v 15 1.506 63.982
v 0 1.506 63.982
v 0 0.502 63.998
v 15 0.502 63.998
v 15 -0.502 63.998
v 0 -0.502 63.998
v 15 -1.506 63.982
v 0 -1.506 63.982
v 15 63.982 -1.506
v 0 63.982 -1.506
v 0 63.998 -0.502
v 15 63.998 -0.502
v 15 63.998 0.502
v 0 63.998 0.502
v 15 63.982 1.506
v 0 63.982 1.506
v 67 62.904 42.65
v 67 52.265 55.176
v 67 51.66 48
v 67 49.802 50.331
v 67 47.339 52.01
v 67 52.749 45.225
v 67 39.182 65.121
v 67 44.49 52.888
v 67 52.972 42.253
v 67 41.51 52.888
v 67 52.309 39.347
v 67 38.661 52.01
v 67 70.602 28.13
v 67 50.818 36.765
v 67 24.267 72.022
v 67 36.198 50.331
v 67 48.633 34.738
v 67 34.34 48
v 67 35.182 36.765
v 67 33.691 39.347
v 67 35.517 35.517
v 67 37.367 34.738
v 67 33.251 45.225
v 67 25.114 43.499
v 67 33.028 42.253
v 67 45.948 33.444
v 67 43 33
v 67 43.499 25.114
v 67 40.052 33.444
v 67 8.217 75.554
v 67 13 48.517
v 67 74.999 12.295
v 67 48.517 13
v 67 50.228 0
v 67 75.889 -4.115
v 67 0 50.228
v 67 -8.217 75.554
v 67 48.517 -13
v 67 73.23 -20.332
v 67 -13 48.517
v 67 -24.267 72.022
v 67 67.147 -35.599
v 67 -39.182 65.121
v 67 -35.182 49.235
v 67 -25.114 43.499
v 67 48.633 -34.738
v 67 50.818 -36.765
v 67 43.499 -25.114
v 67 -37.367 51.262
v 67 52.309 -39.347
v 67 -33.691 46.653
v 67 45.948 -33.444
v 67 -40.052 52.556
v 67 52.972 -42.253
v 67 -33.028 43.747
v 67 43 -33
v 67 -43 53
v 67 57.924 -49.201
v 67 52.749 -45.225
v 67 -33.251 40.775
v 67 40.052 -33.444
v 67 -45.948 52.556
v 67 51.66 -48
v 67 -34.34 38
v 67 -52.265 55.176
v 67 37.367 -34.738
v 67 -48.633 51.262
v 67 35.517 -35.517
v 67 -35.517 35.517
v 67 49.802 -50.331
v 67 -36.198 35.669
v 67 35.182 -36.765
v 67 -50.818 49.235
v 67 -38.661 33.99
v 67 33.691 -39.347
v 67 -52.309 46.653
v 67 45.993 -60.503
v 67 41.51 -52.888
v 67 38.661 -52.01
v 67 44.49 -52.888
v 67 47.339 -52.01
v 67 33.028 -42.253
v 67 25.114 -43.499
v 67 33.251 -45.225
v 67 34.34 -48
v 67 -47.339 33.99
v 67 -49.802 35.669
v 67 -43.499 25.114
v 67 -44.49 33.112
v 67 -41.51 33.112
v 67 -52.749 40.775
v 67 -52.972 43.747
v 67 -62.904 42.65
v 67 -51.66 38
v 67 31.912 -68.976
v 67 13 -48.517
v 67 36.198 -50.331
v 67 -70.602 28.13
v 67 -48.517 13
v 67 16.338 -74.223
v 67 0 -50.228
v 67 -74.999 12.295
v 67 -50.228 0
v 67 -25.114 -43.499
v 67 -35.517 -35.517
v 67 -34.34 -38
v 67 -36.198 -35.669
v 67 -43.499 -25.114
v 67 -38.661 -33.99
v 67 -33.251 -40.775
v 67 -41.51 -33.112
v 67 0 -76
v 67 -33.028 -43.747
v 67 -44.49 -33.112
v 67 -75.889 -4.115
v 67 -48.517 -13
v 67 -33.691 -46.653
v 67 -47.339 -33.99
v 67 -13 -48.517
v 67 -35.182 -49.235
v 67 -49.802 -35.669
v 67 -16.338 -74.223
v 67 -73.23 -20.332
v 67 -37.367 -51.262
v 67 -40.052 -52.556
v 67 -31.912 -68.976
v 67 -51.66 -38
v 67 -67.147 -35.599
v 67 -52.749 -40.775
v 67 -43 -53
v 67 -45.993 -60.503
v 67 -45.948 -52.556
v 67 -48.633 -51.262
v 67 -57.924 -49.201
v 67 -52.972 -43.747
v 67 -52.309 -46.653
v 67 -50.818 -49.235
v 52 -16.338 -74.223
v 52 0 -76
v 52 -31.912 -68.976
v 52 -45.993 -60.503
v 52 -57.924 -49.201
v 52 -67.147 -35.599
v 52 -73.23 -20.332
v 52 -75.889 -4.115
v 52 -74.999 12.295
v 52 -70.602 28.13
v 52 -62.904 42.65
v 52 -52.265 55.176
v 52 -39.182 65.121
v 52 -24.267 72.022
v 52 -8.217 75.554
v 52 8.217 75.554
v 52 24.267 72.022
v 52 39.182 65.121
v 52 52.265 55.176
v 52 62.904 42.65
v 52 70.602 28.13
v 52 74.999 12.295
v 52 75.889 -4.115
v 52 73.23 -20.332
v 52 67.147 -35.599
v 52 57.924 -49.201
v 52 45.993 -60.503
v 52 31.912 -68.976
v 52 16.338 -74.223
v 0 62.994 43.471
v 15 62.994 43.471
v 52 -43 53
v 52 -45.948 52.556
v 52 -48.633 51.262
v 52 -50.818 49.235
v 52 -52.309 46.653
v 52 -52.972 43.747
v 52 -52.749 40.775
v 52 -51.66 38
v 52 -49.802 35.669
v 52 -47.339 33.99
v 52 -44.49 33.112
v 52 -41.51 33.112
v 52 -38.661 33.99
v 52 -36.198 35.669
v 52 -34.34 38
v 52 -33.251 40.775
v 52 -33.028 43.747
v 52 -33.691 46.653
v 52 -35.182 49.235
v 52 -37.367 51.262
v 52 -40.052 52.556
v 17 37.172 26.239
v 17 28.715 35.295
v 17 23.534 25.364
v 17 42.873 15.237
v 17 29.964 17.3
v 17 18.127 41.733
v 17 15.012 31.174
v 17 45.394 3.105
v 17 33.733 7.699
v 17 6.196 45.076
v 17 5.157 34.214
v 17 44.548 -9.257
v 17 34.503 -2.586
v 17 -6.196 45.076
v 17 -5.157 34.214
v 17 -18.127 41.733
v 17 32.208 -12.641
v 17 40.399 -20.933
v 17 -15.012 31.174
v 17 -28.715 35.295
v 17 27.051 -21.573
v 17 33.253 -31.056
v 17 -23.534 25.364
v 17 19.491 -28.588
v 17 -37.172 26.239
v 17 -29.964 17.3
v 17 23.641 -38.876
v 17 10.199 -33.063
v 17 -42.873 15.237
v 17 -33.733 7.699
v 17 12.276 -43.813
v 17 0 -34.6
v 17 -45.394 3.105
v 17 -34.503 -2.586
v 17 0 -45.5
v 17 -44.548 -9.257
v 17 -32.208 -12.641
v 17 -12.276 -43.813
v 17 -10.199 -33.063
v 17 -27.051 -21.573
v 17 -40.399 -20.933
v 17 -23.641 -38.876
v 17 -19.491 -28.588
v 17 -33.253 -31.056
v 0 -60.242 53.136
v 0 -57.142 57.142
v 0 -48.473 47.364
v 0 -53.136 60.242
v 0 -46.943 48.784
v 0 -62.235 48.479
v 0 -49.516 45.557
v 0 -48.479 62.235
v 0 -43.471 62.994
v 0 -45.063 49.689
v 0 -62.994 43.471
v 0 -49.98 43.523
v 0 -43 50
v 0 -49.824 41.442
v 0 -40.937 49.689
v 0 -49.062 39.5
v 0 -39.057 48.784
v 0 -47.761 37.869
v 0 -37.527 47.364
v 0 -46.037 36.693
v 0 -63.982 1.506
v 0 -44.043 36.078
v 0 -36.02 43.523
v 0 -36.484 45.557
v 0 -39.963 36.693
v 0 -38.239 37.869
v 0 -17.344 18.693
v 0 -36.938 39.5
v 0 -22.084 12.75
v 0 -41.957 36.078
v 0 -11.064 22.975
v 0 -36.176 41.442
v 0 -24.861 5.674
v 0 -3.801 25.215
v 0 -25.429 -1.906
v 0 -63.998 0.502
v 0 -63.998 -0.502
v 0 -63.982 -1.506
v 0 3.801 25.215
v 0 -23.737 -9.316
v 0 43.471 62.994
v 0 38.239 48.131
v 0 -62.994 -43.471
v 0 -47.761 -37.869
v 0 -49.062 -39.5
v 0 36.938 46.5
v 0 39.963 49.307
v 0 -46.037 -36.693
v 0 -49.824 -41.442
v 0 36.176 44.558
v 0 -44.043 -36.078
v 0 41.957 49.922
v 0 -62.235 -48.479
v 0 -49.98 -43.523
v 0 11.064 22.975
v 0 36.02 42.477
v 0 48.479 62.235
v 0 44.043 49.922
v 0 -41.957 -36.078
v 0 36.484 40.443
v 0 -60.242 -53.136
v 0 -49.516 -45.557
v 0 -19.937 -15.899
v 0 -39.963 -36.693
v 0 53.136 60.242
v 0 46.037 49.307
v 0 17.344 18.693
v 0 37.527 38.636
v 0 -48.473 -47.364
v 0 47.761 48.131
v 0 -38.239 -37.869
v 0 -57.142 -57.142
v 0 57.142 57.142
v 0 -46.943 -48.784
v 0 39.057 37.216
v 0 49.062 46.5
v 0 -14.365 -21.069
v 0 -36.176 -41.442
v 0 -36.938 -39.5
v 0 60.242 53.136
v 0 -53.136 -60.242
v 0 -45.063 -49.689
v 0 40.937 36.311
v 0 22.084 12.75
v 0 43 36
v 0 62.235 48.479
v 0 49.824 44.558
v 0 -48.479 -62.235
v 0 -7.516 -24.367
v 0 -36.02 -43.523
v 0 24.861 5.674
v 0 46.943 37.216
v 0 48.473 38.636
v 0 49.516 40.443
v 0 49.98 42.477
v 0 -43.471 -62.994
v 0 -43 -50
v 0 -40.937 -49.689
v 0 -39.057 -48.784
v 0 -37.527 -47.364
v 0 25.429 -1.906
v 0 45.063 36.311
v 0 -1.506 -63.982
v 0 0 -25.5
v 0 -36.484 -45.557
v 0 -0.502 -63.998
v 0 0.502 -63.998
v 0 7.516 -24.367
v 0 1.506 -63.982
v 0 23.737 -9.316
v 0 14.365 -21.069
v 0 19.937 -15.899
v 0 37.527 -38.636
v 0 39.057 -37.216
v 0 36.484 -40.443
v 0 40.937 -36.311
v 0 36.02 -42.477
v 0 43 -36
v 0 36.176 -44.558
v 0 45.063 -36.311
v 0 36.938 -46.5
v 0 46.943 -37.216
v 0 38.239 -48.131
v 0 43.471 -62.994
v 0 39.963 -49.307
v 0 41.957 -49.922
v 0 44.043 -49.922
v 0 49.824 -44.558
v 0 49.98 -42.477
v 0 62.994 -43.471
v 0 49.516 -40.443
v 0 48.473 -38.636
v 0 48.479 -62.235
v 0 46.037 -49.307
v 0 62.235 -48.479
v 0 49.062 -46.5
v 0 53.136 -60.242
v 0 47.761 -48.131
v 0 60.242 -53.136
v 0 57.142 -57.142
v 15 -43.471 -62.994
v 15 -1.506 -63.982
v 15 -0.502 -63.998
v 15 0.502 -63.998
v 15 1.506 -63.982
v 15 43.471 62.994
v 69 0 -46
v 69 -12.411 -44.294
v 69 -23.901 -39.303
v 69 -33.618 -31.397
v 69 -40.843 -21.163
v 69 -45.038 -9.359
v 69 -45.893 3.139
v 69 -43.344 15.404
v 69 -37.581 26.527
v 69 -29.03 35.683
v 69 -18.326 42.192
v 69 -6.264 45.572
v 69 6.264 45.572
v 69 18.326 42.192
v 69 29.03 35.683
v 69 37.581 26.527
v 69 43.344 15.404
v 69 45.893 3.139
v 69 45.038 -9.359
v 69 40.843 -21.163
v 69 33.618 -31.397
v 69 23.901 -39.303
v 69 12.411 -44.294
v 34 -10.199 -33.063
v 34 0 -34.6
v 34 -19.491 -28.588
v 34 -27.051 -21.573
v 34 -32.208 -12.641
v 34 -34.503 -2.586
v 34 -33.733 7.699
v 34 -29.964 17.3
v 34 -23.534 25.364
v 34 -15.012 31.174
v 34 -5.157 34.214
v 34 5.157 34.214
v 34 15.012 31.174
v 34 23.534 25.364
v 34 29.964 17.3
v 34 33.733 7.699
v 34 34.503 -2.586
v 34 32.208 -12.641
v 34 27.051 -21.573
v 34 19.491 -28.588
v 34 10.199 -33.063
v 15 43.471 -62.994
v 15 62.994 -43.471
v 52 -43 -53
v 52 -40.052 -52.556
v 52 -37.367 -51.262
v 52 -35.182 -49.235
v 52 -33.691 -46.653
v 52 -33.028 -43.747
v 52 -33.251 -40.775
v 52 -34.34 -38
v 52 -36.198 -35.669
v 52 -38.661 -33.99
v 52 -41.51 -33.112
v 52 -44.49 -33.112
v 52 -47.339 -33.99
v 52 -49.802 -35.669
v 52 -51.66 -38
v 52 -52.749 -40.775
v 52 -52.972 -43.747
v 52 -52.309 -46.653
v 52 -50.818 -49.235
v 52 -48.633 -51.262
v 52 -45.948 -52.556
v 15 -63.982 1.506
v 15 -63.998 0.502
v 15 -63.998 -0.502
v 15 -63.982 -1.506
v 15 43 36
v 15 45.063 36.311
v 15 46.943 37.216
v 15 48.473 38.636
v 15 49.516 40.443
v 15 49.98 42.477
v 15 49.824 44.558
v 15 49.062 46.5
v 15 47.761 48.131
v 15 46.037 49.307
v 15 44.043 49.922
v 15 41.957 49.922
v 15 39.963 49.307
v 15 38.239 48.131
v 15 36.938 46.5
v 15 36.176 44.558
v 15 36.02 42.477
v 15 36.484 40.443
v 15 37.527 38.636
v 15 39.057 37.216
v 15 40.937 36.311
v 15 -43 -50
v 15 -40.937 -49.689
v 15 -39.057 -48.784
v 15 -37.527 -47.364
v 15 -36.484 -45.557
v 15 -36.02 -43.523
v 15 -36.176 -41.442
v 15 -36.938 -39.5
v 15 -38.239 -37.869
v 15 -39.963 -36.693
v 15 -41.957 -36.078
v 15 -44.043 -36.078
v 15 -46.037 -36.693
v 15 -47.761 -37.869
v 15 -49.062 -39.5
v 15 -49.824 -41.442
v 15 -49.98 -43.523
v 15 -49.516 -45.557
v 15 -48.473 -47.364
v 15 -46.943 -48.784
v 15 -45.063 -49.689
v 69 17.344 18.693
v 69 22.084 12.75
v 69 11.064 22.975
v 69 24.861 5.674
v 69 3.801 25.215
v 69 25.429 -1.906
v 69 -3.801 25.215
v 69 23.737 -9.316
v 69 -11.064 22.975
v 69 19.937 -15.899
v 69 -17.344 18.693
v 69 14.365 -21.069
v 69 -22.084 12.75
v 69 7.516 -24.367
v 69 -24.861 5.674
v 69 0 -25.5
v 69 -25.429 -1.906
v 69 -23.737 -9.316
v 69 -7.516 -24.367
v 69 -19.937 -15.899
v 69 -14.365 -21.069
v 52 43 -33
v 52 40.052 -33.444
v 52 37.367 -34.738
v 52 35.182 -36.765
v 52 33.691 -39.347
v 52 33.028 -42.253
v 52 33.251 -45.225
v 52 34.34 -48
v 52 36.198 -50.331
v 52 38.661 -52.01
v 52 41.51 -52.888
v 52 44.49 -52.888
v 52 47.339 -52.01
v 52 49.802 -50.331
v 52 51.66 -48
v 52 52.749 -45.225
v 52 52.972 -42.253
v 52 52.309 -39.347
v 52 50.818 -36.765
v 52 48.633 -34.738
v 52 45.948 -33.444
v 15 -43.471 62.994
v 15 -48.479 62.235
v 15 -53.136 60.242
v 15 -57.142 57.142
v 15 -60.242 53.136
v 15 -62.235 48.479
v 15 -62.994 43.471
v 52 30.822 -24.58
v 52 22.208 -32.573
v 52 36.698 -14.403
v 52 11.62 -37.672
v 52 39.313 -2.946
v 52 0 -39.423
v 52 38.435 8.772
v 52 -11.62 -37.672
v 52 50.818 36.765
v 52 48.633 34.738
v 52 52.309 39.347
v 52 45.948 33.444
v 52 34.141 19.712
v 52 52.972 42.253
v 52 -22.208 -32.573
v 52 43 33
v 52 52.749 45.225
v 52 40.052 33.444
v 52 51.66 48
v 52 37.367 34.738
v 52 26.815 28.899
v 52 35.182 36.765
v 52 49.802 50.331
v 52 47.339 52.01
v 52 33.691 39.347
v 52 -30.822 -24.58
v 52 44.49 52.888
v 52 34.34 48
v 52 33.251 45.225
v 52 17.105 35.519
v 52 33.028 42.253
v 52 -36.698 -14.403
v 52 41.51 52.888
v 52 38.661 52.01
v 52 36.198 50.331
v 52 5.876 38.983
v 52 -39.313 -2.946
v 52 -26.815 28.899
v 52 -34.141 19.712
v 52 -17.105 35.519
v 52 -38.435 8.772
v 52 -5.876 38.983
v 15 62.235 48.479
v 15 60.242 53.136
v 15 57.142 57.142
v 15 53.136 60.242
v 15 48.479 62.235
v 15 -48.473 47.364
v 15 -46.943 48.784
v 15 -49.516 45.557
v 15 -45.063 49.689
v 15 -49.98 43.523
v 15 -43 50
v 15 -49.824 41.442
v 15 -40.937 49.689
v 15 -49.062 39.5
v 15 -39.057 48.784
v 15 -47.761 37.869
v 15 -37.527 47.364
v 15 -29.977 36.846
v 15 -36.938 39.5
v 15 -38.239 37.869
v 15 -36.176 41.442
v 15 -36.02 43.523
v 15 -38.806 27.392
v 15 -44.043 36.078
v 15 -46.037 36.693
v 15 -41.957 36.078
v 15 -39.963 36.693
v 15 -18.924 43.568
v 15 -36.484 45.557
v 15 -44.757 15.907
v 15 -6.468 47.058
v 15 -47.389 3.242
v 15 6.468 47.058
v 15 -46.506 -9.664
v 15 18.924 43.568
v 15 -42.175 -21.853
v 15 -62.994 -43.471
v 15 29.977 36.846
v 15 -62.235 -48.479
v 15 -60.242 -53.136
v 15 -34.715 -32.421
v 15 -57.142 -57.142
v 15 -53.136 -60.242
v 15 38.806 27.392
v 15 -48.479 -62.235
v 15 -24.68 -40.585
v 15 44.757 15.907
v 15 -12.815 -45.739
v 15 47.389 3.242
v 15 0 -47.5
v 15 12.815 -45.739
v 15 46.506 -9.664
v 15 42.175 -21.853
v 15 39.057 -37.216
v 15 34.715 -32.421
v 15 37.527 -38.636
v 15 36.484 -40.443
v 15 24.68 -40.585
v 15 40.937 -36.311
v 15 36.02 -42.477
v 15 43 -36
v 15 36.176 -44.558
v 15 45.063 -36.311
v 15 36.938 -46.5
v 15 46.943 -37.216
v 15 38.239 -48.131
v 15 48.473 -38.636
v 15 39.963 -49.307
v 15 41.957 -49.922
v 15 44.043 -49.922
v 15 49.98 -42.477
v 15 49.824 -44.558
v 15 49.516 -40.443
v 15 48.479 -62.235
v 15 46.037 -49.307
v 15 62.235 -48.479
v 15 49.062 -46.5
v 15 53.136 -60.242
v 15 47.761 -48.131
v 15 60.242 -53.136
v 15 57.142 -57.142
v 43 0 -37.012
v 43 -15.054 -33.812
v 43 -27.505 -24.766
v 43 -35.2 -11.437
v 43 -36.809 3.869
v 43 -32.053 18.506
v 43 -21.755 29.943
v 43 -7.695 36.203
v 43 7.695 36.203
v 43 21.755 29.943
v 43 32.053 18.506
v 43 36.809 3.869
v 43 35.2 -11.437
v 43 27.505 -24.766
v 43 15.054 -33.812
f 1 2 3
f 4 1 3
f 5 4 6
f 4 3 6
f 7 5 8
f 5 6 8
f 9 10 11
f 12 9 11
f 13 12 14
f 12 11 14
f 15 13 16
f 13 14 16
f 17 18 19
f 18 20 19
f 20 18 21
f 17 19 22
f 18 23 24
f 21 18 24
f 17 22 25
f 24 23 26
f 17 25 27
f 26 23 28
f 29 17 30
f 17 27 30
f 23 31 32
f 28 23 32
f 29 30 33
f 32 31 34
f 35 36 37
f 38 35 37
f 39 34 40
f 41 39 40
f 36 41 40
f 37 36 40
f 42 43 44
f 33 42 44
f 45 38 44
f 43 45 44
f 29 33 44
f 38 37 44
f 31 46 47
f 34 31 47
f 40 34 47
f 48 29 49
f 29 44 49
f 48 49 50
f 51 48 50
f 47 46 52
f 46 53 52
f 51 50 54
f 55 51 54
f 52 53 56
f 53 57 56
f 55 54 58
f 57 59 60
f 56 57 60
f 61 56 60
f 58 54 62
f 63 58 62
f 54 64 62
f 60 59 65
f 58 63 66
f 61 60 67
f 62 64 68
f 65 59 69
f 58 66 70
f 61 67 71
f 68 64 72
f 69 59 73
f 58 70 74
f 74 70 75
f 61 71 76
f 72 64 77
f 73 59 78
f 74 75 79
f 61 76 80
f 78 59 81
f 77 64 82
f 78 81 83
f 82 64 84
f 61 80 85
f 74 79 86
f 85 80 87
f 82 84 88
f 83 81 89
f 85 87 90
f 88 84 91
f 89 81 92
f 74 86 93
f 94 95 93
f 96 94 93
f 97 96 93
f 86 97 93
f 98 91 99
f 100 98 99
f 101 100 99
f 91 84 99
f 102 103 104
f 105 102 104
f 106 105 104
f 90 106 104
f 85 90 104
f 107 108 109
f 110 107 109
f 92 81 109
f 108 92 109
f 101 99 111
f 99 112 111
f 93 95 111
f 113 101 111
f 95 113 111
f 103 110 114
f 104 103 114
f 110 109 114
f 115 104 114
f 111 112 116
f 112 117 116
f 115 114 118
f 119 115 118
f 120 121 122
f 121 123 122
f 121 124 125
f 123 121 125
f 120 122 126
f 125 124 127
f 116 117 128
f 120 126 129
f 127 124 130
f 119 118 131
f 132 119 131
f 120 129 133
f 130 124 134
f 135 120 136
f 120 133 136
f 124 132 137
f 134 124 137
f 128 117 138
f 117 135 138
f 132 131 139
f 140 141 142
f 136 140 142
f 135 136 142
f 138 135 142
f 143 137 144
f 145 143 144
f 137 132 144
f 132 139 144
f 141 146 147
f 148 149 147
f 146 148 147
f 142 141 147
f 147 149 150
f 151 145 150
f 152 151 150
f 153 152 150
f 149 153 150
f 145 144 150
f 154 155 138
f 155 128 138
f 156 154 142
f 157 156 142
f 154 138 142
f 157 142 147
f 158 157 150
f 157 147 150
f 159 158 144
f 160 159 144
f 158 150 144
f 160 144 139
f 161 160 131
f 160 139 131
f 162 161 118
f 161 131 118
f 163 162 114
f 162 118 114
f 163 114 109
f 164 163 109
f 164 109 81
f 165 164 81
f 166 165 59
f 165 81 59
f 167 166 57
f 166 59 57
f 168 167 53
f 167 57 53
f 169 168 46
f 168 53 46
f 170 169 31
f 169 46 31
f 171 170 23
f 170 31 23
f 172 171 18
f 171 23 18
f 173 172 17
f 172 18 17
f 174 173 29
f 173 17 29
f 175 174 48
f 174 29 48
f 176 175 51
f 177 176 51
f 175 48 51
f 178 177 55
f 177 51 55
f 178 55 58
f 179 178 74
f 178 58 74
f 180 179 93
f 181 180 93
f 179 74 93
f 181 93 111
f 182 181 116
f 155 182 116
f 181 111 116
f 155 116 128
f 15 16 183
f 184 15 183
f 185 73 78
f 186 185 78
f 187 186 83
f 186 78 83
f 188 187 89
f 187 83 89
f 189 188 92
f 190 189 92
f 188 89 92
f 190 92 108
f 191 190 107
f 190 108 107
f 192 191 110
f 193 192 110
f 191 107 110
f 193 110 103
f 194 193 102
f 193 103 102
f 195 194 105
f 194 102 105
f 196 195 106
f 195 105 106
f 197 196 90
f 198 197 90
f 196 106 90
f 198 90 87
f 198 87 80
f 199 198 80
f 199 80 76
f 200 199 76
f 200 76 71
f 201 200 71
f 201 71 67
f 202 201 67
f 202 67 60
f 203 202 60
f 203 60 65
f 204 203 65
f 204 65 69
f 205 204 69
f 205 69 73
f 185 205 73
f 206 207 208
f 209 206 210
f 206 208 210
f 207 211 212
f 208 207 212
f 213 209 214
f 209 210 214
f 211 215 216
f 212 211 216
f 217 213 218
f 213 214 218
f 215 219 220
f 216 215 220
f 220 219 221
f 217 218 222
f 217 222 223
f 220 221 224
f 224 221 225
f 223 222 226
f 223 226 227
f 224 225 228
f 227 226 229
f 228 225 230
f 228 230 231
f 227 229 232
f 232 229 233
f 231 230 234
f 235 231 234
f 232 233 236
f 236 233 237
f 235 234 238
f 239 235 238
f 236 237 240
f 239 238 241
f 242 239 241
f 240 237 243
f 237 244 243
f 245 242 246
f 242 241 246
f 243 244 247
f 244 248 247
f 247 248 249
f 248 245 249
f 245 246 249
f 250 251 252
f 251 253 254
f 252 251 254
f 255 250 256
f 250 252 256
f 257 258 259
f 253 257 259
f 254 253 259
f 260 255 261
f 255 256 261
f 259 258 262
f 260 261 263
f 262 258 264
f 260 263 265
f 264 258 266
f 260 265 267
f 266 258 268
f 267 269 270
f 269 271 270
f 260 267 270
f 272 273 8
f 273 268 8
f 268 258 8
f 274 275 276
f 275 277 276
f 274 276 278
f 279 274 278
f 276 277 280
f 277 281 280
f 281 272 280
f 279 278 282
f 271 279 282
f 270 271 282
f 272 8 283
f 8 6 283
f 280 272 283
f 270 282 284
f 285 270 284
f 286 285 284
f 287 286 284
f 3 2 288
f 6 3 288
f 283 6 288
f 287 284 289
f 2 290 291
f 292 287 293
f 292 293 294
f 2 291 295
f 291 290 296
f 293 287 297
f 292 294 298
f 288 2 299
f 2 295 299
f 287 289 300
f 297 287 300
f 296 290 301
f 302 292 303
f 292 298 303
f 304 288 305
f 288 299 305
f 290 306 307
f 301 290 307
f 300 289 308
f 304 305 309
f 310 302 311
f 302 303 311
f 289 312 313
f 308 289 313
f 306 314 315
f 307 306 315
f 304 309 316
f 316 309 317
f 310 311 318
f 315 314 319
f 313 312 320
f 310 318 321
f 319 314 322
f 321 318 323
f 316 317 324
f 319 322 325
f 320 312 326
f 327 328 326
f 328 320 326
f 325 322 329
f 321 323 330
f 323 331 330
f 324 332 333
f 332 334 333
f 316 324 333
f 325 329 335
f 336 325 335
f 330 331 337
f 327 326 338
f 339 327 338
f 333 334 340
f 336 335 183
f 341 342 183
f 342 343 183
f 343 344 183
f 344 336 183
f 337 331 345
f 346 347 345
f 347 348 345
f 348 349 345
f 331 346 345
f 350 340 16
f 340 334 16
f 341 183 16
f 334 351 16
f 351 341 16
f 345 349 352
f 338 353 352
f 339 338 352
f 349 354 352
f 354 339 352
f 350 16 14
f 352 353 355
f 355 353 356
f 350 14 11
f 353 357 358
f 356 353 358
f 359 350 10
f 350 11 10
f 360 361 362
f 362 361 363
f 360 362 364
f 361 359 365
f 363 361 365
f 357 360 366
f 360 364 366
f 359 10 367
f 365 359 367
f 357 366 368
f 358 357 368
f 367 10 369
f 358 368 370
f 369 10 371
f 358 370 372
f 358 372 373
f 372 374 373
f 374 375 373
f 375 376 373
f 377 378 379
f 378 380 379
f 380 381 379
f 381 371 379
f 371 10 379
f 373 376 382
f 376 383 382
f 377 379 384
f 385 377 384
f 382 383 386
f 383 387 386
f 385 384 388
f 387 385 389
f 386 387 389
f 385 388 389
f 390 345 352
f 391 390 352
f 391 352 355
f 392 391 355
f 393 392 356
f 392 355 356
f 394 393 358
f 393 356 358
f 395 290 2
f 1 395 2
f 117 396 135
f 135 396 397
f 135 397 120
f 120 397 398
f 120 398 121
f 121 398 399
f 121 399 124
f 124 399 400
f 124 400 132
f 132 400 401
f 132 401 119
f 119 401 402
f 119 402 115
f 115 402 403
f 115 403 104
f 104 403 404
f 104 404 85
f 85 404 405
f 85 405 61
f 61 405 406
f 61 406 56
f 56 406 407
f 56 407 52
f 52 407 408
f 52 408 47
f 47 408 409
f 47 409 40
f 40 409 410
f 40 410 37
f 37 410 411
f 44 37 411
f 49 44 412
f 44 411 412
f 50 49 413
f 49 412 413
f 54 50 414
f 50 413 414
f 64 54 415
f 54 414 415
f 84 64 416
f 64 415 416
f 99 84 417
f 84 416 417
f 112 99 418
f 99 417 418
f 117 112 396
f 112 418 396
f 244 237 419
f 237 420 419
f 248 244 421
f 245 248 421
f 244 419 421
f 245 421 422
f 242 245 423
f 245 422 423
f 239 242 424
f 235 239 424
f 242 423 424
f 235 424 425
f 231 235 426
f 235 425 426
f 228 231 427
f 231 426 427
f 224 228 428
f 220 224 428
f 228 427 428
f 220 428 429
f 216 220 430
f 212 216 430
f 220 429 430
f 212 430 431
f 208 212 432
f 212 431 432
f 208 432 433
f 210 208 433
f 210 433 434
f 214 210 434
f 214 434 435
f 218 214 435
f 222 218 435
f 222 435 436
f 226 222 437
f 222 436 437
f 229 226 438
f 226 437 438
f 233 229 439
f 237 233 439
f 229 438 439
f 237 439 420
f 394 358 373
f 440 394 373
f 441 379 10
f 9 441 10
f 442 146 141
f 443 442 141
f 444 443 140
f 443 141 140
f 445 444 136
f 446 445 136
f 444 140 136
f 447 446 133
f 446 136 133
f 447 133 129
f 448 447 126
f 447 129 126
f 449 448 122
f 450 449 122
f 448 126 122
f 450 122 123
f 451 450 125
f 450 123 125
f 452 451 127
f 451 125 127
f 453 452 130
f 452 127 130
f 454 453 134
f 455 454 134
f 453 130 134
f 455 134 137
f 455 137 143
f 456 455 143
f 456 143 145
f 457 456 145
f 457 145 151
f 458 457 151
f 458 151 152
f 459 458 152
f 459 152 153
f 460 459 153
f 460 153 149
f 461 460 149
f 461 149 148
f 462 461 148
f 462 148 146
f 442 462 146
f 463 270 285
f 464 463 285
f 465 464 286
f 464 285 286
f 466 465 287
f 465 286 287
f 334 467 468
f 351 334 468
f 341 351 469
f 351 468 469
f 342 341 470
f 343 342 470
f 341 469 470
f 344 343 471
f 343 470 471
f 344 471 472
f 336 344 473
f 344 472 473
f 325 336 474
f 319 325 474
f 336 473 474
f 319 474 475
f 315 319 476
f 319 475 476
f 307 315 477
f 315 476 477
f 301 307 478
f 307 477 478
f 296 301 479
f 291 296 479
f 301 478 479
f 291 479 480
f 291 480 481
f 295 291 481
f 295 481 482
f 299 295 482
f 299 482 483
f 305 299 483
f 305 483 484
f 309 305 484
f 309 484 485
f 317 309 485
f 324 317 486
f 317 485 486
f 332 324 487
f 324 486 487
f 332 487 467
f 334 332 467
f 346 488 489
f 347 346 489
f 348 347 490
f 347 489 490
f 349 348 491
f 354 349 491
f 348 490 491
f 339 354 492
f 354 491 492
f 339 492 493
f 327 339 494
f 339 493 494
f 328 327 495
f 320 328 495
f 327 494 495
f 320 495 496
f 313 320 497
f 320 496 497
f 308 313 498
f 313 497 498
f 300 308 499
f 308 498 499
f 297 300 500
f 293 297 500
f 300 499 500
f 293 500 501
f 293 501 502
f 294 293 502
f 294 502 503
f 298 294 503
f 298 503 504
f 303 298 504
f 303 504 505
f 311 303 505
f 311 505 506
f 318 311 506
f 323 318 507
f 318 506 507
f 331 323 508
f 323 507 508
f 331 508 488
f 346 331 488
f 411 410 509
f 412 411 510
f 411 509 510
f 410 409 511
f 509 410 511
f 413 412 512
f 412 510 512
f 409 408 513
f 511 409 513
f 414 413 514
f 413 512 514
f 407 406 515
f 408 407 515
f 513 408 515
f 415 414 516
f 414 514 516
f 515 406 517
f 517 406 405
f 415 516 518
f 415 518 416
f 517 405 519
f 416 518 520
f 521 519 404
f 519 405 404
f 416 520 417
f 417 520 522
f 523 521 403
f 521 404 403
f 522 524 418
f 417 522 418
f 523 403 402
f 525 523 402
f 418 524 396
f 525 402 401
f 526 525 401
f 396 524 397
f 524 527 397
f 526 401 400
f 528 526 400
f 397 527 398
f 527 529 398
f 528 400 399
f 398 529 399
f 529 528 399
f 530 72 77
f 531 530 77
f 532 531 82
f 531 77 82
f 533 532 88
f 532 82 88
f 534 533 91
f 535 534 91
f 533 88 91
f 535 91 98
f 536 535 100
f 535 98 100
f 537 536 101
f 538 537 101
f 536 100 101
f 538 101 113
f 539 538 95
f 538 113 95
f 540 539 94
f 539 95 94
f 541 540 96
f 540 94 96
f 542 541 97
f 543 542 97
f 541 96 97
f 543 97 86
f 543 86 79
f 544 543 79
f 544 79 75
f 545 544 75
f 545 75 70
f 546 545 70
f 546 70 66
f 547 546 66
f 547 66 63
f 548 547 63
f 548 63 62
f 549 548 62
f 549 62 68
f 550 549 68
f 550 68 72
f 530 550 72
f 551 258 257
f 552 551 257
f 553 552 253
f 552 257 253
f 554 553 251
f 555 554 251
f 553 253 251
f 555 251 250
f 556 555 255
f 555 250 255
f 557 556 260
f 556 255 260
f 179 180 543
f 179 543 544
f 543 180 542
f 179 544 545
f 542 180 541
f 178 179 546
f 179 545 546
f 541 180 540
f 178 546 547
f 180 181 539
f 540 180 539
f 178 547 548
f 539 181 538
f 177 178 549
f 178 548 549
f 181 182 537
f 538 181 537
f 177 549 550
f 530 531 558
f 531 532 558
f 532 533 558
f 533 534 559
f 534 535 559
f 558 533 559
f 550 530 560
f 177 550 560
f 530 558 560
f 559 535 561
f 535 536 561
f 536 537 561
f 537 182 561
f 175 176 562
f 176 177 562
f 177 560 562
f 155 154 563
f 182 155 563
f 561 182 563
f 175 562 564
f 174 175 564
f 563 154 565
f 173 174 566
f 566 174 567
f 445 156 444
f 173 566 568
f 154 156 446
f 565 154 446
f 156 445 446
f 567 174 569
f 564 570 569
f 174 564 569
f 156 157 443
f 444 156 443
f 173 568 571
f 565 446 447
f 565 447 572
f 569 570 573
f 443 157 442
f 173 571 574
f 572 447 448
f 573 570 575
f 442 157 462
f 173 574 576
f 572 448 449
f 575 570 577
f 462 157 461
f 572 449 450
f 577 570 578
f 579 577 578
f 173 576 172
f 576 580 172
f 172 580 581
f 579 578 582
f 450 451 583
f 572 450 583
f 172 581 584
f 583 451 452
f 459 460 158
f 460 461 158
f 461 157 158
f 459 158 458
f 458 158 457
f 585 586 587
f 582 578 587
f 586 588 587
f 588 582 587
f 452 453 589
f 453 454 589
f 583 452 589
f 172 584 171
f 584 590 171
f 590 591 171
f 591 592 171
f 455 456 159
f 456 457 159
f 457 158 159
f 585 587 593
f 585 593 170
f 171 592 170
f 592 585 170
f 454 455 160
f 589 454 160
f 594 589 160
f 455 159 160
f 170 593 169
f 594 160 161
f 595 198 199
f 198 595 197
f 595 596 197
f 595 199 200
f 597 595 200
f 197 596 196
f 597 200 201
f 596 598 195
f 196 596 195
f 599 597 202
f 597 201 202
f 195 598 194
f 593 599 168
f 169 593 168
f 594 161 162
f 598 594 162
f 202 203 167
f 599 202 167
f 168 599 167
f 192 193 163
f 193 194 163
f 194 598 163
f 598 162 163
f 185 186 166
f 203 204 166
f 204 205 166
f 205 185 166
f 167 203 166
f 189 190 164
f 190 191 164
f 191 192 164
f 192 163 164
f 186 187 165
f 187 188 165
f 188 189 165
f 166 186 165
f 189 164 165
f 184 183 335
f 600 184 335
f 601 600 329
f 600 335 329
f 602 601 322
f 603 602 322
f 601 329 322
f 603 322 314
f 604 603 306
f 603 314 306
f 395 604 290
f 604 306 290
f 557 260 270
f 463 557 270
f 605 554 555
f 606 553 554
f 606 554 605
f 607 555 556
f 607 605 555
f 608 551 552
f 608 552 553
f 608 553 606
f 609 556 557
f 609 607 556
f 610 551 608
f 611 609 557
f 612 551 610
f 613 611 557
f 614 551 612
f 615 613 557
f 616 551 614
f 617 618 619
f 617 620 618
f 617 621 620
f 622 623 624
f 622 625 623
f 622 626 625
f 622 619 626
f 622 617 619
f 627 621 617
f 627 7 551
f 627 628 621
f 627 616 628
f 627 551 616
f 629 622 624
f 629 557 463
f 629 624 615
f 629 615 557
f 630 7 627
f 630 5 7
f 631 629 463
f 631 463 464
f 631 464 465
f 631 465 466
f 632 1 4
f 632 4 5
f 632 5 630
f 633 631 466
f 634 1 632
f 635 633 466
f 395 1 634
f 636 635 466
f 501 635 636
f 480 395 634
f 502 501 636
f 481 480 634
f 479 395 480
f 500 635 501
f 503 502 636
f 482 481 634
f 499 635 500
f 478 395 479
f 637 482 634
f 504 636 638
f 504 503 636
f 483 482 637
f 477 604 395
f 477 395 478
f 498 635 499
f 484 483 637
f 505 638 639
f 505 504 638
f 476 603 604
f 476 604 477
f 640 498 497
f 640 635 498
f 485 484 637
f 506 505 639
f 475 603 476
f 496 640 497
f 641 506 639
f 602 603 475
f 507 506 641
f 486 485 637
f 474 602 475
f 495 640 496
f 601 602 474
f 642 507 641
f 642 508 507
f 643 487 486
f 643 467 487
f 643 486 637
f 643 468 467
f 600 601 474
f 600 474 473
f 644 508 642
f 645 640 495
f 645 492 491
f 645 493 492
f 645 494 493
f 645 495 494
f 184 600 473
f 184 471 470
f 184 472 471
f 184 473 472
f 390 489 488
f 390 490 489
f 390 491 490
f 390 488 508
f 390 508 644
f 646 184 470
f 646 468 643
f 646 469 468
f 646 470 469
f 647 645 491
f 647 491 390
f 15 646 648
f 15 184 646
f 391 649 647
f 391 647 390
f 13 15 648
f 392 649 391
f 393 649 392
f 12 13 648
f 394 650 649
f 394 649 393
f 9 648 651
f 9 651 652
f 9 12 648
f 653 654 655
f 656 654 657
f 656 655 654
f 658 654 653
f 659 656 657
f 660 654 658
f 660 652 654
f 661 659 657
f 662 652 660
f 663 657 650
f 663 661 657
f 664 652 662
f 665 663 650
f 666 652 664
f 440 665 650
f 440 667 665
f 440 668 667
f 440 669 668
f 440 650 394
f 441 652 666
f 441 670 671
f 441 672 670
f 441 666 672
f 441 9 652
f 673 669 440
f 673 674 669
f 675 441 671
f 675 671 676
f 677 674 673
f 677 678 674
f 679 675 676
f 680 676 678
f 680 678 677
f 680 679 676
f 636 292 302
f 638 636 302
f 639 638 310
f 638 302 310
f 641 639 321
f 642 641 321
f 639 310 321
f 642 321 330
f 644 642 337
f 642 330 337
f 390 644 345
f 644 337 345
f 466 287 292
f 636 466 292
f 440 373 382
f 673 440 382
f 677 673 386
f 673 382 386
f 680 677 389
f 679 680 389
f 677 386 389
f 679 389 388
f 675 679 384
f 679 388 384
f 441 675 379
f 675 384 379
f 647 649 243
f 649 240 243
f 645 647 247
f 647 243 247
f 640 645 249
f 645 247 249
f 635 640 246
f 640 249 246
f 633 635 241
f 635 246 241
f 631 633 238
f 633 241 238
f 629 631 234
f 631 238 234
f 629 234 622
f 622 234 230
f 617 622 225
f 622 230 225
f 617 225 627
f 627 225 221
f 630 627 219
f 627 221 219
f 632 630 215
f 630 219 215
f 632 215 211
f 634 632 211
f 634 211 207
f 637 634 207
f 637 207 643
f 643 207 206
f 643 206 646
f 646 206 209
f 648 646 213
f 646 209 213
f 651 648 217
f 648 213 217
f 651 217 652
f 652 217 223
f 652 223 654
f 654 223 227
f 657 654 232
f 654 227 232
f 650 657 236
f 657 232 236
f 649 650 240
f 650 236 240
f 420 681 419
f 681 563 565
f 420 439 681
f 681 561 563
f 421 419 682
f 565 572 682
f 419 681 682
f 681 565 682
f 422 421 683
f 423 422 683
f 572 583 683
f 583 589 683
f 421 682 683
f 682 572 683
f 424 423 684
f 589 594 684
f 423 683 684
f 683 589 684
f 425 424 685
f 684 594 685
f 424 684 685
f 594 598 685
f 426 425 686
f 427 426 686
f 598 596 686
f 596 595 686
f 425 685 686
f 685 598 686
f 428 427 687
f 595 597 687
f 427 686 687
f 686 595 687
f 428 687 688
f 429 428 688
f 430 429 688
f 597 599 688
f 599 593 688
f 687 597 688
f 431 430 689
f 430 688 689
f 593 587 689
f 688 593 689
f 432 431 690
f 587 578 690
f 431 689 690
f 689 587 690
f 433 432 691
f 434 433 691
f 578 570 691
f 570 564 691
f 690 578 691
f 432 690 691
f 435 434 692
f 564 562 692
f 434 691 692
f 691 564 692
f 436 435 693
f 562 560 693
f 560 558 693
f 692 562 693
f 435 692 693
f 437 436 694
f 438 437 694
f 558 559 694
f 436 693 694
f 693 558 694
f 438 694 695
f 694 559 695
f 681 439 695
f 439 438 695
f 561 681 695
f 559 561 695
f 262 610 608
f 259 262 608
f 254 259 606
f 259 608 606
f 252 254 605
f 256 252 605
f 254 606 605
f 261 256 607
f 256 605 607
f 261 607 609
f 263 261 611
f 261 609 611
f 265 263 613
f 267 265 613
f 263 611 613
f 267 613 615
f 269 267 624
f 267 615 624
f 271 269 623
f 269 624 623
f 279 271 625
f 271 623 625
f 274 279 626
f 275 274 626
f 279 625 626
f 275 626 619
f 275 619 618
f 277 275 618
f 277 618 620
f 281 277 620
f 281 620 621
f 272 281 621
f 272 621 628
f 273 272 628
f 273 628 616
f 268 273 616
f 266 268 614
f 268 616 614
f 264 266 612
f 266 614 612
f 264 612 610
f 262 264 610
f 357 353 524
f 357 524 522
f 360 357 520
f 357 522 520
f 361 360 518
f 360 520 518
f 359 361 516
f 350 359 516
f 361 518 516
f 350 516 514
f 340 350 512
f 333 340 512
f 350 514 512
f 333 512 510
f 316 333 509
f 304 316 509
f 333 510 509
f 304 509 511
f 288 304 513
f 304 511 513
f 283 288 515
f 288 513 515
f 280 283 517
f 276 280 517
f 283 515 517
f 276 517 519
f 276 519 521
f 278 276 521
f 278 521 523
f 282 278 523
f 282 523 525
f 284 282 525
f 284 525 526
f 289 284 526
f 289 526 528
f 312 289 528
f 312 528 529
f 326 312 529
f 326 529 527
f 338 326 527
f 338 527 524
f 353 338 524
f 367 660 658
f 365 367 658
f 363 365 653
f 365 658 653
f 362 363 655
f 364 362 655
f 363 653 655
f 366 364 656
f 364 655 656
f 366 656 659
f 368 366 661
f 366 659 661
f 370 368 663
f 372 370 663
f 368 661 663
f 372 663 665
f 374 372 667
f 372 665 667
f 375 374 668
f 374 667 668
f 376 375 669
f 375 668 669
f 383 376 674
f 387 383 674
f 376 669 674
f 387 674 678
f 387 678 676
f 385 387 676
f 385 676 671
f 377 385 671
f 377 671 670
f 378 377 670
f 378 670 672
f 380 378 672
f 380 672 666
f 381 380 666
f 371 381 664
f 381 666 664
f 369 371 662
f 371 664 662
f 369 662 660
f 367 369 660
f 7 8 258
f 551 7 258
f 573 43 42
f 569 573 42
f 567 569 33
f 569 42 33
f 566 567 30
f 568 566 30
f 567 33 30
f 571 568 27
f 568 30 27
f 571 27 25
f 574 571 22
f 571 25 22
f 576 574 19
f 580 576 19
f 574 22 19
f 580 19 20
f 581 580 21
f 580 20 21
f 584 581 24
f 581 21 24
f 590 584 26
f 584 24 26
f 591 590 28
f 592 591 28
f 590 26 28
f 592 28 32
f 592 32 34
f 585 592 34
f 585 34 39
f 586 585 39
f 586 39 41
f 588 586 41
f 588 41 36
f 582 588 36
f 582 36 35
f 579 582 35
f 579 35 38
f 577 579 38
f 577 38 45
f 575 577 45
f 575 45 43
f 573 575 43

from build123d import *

# Parameters (mm, degrees)
BOSS_EXTRUDE1_DEPTH = 15
SKETCH3_R           = 7
CUT_EXTRUDE1_DEPTH  = 15
SKETCH7_R           = 25.5
CUT_EXTRUDE2_DEPTH  = 128.72235513
SKETCH10_R          = 10
CUT_EXTRUDE3_DEPTH  = 25


with BuildPart() as part:
    # Sketch2 → Boss-Extrude1 (new body)
    with BuildSketch(Plane(origin=(0, 0, 0), x_dir=(0, 0, -1), z_dir=(1, 0, 0))):
        with BuildLine():
            Line((62.994461331, -43.470654948), (63.982276259, -1.506095834))
            ThreePointArc((63.982276259, -1.506095834), (64, 0), (63.982276259, 1.506095834))
            Line((63.982276259, 1.506095834), (62.994461331, 43.470654948))
            ThreePointArc((62.994461331, 43.470654948), (57.142135624, 57.142135624), (43.470654948, 62.994461331))
            Line((43.470654948, 62.994461331), (1.506095834, 63.982276259))
            ThreePointArc((1.506095834, 63.982276259), (0, 64), (-1.506095834, 63.982276259))
            Line((-1.506095834, 63.982276259), (-43.470654948, 62.994461331))
            ThreePointArc((-43.470654948, 62.994461331), (-57.142135624, 57.142135624), (-62.994461331, 43.470654948))
            Line((-62.994461331, 43.470654948), (-63.982276259, 1.506095834))
            ThreePointArc((-63.982276259, 1.506095834), (-64, 0), (-63.982276259, -1.506095834))
            Line((-63.982276259, -1.506095834), (-62.994461331, -43.470654948))
            ThreePointArc((-62.994461331, -43.470654948), (-57.142135624, -57.142135624), (-43.470654948, -62.994461331))
            Line((-43.470654948, -62.994461331), (-1.506095834, -63.982276259))
            ThreePointArc((-1.506095834, -63.982276259), (0, -64), (1.506095834, -63.982276259))
            Line((1.506095834, -63.982276259), (43.470654948, -62.994461331))
            ThreePointArc((43.470654948, -62.994461331), (57.142135624, -57.142135624), (62.994461331, -43.470654948))
        make_face()
    extrude(amount=BOSS_EXTRUDE1_DEPTH)

    # Sketch3 → Cut-Extrude1 (cut)
    with BuildSketch(Plane(origin=(15, 0, 0), x_dir=(0, 0, -1), z_dir=(1, 0, 0))):
        with Locations((-43, 43)):
            Circle(SKETCH3_R)
        with Locations(Location((43, 43, 0), (0, 0, 180))):
            Circle(SKETCH3_R)
        with Locations((43, -43)):
            Circle(SKETCH3_R)
        with Locations(Location((-43, -43, 0), (0, 0, 180))):
            Circle(SKETCH3_R)
    extrude(amount=-CUT_EXTRUDE1_DEPTH, mode=Mode.SUBTRACT)

    # Sketch4 → Revolve1 (revolve)
    with BuildSketch(Plane.XY, mode=Mode.PRIVATE) as revolve1_sk:
        Polygon((15, 0), (15, 47.5), (17, 45.5), (17, 34.6), (34, 34.6), (52, 39.423085464), (52, 76), (67, 76), (67, 50.228310139), (69, 46), (69, 0), align=None)
    revolve(revolve1_sk.sketch.rotate(Axis((69, 0, 0), (-1, 0, 0)), 90), axis=Axis((69, 0, 0), (-1, 0, 0)))

    # Sketch7 → Cut-Extrude2 (cut, through all)
    with BuildSketch(Plane(origin=(69, 0, 0), x_dir=(0, 0, -1), z_dir=(1, 0, 0))):
        Circle(SKETCH7_R)
    extrude(amount=-CUT_EXTRUDE2_DEPTH, mode=Mode.SUBTRACT)

    # Sketch10 → Cut-Extrude3 (cut)
    with BuildSketch(Plane(origin=(67, 0, 0), x_dir=(0, 0, -1), z_dir=(1, 0, 0))):
        with Locations((-43, 43)):
            Circle(SKETCH10_R)
        with Locations(Location((43, 43, 0), (0, 0, 180))):
            Circle(SKETCH10_R)
        with Locations((43, -43)):
            Circle(SKETCH10_R)
        with Locations(Location((-43, -43, 0), (0, 0, 180))):
            Circle(SKETCH10_R)
    extrude(amount=-CUT_EXTRUDE3_DEPTH, mode=Mode.SUBTRACT)


solid = part.part
